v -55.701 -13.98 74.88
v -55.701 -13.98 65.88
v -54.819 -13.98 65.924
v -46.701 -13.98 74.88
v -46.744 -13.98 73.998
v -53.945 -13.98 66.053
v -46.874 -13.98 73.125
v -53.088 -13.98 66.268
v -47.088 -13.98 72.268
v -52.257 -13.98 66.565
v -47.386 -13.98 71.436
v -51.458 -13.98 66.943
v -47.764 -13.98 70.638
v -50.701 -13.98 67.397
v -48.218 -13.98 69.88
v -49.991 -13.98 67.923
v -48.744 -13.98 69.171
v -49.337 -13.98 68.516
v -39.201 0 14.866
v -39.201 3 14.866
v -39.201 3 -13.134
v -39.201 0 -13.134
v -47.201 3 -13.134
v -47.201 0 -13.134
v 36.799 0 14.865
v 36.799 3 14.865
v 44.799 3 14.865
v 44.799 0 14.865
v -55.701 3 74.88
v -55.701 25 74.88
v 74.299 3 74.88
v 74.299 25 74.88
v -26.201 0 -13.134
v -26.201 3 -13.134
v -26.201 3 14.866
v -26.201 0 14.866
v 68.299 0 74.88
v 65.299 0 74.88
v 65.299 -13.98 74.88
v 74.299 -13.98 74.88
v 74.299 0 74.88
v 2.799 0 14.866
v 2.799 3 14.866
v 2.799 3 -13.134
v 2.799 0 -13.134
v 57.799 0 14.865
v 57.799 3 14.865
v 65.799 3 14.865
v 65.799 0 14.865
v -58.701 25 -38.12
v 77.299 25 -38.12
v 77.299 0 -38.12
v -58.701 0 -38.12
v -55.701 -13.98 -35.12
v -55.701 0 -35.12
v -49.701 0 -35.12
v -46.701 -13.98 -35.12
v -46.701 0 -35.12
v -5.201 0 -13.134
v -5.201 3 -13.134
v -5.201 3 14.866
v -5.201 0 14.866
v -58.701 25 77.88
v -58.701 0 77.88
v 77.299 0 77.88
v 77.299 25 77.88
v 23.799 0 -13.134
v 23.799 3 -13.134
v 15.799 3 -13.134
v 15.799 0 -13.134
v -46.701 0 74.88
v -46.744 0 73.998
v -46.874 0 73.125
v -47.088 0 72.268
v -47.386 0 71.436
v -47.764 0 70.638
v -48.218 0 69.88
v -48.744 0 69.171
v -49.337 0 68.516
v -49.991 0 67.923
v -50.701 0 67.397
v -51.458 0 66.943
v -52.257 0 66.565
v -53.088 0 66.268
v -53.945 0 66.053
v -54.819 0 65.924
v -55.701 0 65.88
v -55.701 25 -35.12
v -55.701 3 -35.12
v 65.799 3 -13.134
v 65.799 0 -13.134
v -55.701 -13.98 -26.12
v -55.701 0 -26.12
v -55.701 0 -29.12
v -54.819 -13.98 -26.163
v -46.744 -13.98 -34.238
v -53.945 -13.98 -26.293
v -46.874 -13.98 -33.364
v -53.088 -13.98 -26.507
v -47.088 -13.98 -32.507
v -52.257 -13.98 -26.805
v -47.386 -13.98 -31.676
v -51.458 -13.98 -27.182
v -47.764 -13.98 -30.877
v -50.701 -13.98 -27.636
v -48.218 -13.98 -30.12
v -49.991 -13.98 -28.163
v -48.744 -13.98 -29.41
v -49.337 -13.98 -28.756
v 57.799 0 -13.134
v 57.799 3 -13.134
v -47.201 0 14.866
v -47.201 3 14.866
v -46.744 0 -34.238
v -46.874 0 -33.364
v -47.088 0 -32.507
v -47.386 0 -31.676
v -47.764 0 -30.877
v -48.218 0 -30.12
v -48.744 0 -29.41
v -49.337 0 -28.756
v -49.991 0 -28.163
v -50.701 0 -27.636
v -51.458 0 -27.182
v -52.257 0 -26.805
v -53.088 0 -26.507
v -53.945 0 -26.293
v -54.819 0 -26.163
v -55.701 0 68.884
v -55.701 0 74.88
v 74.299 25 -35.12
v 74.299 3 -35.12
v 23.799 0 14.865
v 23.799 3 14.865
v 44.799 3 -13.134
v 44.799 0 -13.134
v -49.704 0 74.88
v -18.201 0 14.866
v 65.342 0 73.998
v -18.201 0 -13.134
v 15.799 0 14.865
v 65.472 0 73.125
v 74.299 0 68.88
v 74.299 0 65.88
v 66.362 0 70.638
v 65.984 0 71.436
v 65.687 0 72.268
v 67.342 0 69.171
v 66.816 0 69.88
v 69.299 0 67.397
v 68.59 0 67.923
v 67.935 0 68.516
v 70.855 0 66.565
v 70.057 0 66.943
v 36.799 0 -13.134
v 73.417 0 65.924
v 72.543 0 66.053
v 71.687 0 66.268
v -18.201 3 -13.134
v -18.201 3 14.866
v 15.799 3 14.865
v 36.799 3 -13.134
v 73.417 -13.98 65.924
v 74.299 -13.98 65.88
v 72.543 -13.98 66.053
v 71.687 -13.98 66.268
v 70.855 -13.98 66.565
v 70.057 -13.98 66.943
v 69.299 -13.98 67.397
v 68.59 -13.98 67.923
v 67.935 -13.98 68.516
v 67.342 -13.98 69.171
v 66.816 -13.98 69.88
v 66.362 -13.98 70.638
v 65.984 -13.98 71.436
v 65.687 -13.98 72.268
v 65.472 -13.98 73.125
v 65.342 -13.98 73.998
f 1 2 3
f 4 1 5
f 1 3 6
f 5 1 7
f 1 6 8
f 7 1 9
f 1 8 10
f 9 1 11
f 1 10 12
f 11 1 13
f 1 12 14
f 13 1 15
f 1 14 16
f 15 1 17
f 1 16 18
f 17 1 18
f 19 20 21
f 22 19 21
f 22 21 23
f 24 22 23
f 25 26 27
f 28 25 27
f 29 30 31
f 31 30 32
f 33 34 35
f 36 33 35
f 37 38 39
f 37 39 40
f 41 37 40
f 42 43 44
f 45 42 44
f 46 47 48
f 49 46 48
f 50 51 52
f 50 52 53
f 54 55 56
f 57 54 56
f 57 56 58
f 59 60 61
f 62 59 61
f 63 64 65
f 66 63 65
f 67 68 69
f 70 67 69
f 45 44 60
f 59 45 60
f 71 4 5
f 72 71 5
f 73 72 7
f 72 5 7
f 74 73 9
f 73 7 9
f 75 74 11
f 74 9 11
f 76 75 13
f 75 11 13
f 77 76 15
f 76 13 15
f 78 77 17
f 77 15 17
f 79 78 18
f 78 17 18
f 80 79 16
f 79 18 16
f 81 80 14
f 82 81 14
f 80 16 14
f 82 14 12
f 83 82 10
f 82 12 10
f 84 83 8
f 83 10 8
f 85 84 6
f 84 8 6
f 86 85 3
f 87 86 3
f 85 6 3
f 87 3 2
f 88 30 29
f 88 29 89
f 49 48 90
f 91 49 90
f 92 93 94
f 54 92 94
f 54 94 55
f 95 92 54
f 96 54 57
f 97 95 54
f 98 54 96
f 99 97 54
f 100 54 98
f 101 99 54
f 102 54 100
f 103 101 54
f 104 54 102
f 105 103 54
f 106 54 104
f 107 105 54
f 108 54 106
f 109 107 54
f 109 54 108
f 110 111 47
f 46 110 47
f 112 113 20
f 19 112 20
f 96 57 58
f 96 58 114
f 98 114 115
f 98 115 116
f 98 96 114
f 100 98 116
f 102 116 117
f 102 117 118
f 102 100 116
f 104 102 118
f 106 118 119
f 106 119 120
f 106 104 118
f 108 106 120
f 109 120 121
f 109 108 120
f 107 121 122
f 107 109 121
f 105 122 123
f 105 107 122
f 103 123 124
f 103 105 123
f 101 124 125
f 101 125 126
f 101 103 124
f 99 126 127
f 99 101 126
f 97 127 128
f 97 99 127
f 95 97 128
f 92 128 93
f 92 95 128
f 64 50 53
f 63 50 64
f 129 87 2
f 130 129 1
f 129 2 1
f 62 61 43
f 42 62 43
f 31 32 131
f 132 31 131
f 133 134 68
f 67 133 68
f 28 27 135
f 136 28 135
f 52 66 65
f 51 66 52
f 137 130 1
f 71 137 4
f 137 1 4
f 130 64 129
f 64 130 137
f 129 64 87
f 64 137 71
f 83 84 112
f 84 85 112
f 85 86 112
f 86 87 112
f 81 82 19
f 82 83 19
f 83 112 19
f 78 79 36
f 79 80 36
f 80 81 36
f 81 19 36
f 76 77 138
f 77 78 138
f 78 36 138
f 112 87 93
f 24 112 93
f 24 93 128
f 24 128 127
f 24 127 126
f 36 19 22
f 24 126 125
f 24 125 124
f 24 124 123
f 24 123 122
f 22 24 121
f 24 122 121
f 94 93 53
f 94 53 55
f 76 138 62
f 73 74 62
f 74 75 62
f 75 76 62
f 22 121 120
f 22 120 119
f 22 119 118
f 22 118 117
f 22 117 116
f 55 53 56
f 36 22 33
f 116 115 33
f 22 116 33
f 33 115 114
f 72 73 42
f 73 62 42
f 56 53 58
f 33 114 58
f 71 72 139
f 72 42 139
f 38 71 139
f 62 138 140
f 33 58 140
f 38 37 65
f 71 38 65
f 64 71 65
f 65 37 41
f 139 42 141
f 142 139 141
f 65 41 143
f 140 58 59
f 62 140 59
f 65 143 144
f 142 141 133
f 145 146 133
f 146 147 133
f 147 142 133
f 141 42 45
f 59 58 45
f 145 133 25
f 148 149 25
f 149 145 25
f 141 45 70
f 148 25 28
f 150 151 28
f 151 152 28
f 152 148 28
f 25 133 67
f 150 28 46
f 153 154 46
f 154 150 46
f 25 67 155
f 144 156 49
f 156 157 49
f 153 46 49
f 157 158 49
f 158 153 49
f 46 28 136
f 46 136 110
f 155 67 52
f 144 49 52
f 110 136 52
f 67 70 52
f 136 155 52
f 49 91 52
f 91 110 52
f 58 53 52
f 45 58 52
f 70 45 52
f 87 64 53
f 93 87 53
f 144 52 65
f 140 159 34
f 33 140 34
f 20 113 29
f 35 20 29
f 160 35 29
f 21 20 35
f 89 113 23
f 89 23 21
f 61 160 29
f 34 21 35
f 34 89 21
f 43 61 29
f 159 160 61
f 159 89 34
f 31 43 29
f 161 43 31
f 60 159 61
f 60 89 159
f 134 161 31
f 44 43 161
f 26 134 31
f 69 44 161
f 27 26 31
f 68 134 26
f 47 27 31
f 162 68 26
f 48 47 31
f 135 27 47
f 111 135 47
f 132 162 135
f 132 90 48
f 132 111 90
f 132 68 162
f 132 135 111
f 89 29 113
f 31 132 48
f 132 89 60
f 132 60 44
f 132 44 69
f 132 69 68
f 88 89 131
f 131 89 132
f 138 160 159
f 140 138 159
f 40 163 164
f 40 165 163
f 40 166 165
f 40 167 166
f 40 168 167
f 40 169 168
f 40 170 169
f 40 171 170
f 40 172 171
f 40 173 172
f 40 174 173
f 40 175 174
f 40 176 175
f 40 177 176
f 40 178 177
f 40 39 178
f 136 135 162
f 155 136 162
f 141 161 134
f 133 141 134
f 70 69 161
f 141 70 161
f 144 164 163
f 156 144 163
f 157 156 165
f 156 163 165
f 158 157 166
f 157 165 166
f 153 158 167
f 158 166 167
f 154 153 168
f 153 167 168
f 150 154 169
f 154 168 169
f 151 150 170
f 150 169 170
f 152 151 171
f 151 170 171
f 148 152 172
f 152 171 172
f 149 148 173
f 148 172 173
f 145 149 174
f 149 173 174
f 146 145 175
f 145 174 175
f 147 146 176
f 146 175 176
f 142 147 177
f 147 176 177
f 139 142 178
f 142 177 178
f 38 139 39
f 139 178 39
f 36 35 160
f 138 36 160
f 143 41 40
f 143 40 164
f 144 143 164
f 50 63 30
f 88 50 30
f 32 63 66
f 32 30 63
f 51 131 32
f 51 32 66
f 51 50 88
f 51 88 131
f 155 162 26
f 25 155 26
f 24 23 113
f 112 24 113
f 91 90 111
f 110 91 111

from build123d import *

# Parameters (mm, degrees)
SKETCH2_W                 = 136
SKETCH2_H                 = 136
BOSS_EXTRUDE1_DEPTH       = 25
SKETCH3_W                 = 118
SKETCH3_H                 = 118
CUT_EXTRUDE1_DEPTH        = 22
CUT_EXTRUDE3_DEPTH        = 22
CUT_EXTRUDE4_DEPTH        = 22
SKETCH7_W                 = 29.69848481
SKETCH7_H                 = 30.00387357
BOSS_EXTRUDE2_DEPTH       = 25
BOSS_EXTRUDE3_DEPTH       = 3
CUT_EXTRUDE5_DEPTH        = 23
CUT_EXTRUDE6_DEPTH        = 22
CUT_EXTRUDE7_DEPTH        = 32
BOSS_EXTRUDE6_DEPTH       = 6.36
BOSS_EXTRUDE7_DEPTH       = 6.36
CUT_EXTRUDE9_DEPTH        = 6.36
CUT_EXTRUDE10_DEPTH       = 56.36
BOSS_EXTRUDE8_DEPTH       = 3
BOSS_EXTRUDE9_START       = -20
BOSS_EXTRUDE9_DEPTH       = 2
SKETCH23_W                = 29.69848481
SKETCH23_H                = 2
BOSS_EXTRUDE10_DEPTH      = 1.5
SKETCH24_W                = 10.361394494
SKETCH24_H                = 0.734081985
CUT_EXTRUDE11_DEPTH       = 31.5
BOSS_EXTRUDE11_DEPTH      = 4
BOSS_EXTRUDE12_DEPTH      = 44
CUT_EXTRUDE12_DEPTH       = 50
BOSS_EXTRUDE13_DEPTH      = 3
BOSS_EXTRUDE14_DEPTH      = 22
SKETCH33_W                = 130
SKETCH33_H                = 130
CUT_EXTRUDE13_DEPTH       = 22
CUT_EXTRUDE15_DEPTH       = 12
CUT_EXTRUDE16_DEPTH       = 32
BOSS_EXTRUDE15_DEPTH      = 22
BOSS_EXTRUDE15_DEPTH_BACK = 3
BOSS_EXTRUDE16_DEPTH      = 16.980368
CUT_EXTRUDE17_DEPTH       = 2
BOSS_EXTRUDE17_DEPTH      = 14.980368
CUT_EXTRUDE18_DEPTH       = 1
BOSS_EXTRUDE20_DEPTH      = 13.980368


with BuildPart() as part:
    # Sketch2 → Boss-Extrude1 (new body)
    with BuildSketch(Plane(origin=(0, 0, 0), x_dir=(1, 0, 0), z_dir=(0, 1, 0))):
        with Locations((9.299145299, -9.88034188)):
            Rectangle(SKETCH2_W, SKETCH2_H)
    extrude(amount=BOSS_EXTRUDE1_DEPTH)

    # Sketch3 → Cut-Extrude1 (cut)
    with BuildSketch(Plane(origin=(0, 25, 0), x_dir=(1, 0, 0), z_dir=(0, 1, 0))):
        with Locations((9.299145299, -9.88034188)):
            Rectangle(SKETCH3_W, SKETCH3_H)
    extrude(amount=-CUT_EXTRUDE1_DEPTH, mode=Mode.SUBTRACT)

    # Sketch4 → Cut-Extrude3 (cut)
    with BuildSketch(Plane(origin=(0, 25, 0), x_dir=(1, 0, 0), z_dir=(0, 1, 0))):
        Polygon((77.299145299, -77.88034188), (47.299145299, -77.88034188), (47.299145299, -68.88034188), (56.299145299, -68.88034188), (68.299145299, -56.88034188), (68.299145299, -47.88034188), (77.299145299, -47.88034188), align=None)
    extrude(amount=-CUT_EXTRUDE3_DEPTH, mode=Mode.SUBTRACT)

    # Sketch5 → Cut-Extrude4 (cut)
    with BuildSketch(Plane(origin=(0, 3, 0), x_dir=(1, 0, 0), z_dir=(0, 1, 0))):
        Polygon((68.299145299, -47.88034188), (47.299145299, -68.88034188), (47.299145299, -77.88034188), (77.299145299, -77.88034188), (77.299145299, -47.88034188), align=None)
    extrude(amount=-CUT_EXTRUDE4_DEPTH, mode=Mode.SUBTRACT)

    # Sketch7 → Boss-Extrude2 (add)
    with BuildSketch(Plane(origin=(58.08974359, 0, 58.08974359), x_dir=(0.707106781, 0, -0.707106781), z_dir=(0.707106781, 0, 0.707106781))):
        with Locations((-0.410968044, -12.001936785)):
            Rectangle(SKETCH7_W, SKETCH7_H)
    extrude(amount=BOSS_EXTRUDE2_DEPTH)

    # Sketch8 → Boss-Extrude3 (add)
    with BuildSketch(Plane(origin=(0, 3, 0), x_dir=(1, 0, 0), z_dir=(0, 1, 0))):
        Polygon((47.299145299, -77.88034188), (77.299145299, -47.88034188), (68.299145299, -47.88034188), (47.299145299, -68.88034188), align=None)
    extrude(amount=-BOSS_EXTRUDE3_DEPTH)

    # Sketch9 → Cut-Extrude5 (cut)
    with BuildSketch(Plane(origin=(0, 3, 0), x_dir=(1, 0, 0), z_dir=(0, 1, 0))):
        Polygon((47.299145299, -77.88034188), (38.299145299, -68.88034188), (47.299145299, -68.88034188), align=None)
    extrude(amount=CUT_EXTRUDE5_DEPTH, mode=Mode.SUBTRACT)

    # Sketch10 → Cut-Extrude6 (cut)
    with BuildSketch(Plane(origin=(0, 25, 0), x_dir=(1, 0, 0), z_dir=(0, 1, 0))):
        Polygon((77.299145299, -47.88034188), (68.299145299, -38.88034188), (68.299145299, -47.88034188), align=None)
    extrude(amount=-CUT_EXTRUDE6_DEPTH, mode=Mode.SUBTRACT)

    # Sketch11 → Cut-Extrude7 (cut)
    with BuildSketch(Plane(origin=(-10.790598291, 0, 10.790598291), x_dir=(0.707106781, 0, 0.707106781), z_dir=(-0.707106781, 0, 0.707106781))):
        Polygon((88.51526425, 0), (107.151303219, -18.636038969), (107.151303219, -27.00387357), (82.151303219, -27.00387357), (82.151303219, 0), align=None)
        Polygon((88.51526425, 3), (107.151303219, -15.636038969), (107.151303219, 3), align=None)
    extrude(amount=-CUT_EXTRUDE7_DEPTH, mode=Mode.SUBTRACT)

    # Sketch16 → Boss-Extrude6 (add)
    with BuildSketch(Plane(origin=(-10.790598291, 0, 10.790598291), x_dir=(0.707106781, 0, 0.707106781), z_dir=(-0.707106781, 0, 0.707106781))):
        Polygon((88.51526425, 0), (88.51526425, 3), (107.151303219, -15.636038969), (107.151303219, -18.636038969), align=None)
    extrude(amount=BOSS_EXTRUDE6_DEPTH)

    # Sketch17 → Boss-Extrude7 (add)
    with BuildSketch(Plane(origin=(10.209401709, 0, -10.209401709), x_dir=(-0.707106781, 0, -0.707106781), z_dir=(0.707106781, 0, -0.707106781))):
        Polygon((-88.51526425, 0), (-88.51526425, 3), (-107.151303219, -15.636038969), (-107.151303219, -18.636038969), align=None)
    extrude(amount=BOSS_EXTRUDE7_DEPTH)

    # Sketch18 → Cut-Extrude9 (cut)
    with BuildSketch(Plane(origin=(32.355531967, 45.757632125, 32.355531967), x_dir=(0.866025404, -0.40824829, -0.288675135), z_dir=(0.5, 0.707106781, 0.5))):
        Polygon((51.893180344, -37.364371534), (67.109442444, -58.883415765), (61.91652419, -62.555363477), align=None)
        Polygon((32.474894629, -83.373739388), (37.667812884, -79.701791676), (17.258632528, -61.854695157), align=None)
    extrude(amount=-CUT_EXTRUDE9_DEPTH, mode=Mode.SUBTRACT)

    # Sketch19 → Cut-Extrude10 (cut)
    with BuildSketch(Plane(origin=(-15.287797419, 0, 15.287797419), x_dir=(0.707106781, 0, 0.707106781), z_dir=(-0.707106781, 0, 0.707106781))):
        Polygon((107.151303219, -18.636038969), (107.151303219, -15.636038969), (105.651303219, -17.136038969), align=None)
    extrude(amount=-CUT_EXTRUDE10_DEPTH, mode=Mode.SUBTRACT)

    # Sketch20 → Boss-Extrude8 (add)
    with BuildSketch(Plane.XZ):
        Polygon((-58.700854701, 77.88034188), (47.299145299, 77.88034188), (77.299145299, 47.88034188), (77.299145299, -58.11965812), (-58.700854701, -58.11965812), align=None)
    extrude(amount=-BOSS_EXTRUDE8_DEPTH)



with BuildPart() as body_2:
    # Sketch22 → Boss-Extrude9 (new body)
    with BuildSketch(Plane(origin=(0, 3, 0), x_dir=(1, 0, 0), z_dir=(0, 1, 0)).offset(BOSS_EXTRUDE9_START)):
        Polygon((64.976814829, -86.55801141), (70.906234285, -91.928484844), (91.906234285, -70.928484844), (85.976814829, -65.55801141), align=None)
    extrude(amount=BOSS_EXTRUDE9_DEPTH)


with BuildPart() as part_1:
    add(part.part)

    add(body_2.part)  # Boss-Extrude10 merges body 2
    # Sketch23 → Boss-Extrude10 (add)
    with BuildSketch(Plane(origin=(75.767413119, 0, 75.767413119), x_dir=(-0.707106781, 0, 0.707106781), z_dir=(-0.707106781, 0, -0.707106781))):
        with Locations((0.410968044, -16)):
            Rectangle(SKETCH23_W, SKETCH23_H)
    extrude(amount=BOSS_EXTRUDE10_DEPTH)

    # Sketch24 → Cut-Extrude11 (cut)
    with BuildSketch(Plane(origin=(-13.785543706, 0, 15.220310104), x_dir=(0.741177432, 0, 0.671309179), z_dir=(-0.671309179, 0, 0.741177432))):
        with Locations((109.085839112, -17.367040993)):
            Rectangle(SKETCH24_W, SKETCH24_H)
    extrude(amount=-CUT_EXTRUDE11_DEPTH, mode=Mode.SUBTRACT)

    # Sketch28 → Boss-Extrude11 (add)
    with BuildSketch(Plane(origin=(32.355531967, 45.757632125, 32.355531967), x_dir=(0.866025404, -0.40824829, -0.288675135), z_dir=(0.5, 0.707106781, 0.5))):
        Polygon((17.25539836, -61.856982059), (8.148098637, -53.895706291), (47.339944519, -25.921031992), (51.893180344, -37.364371534), align=None)
    extrude(amount=-BOSS_EXTRUDE11_DEPTH)

    # Sketch29 → Boss-Extrude12 (add)
    with BuildSketch(Plane(origin=(14.709401709, 0, -14.709401709), x_dir=(0.707106781, 0, 0.707106781), z_dir=(-0.707106781, 0, 0.707106781))):
        Polygon((80.058656938, 11.456607312), (75.787342189, 11.456607312), (75.787342189, 3), (82.858410001, 3), align=None)
    extrude(amount=BOSS_EXTRUDE12_DEPTH)

    # Sketch30 → Cut-Extrude12 (cut)
    with BuildSketch(Plane(origin=(0, 25, 0), x_dir=(1, 0, 0), z_dir=(0, 1, 0))):
        Polygon((38.299145299, -68.88034188), (68.299145299, -38.88034188), (77.299145299, -47.88034188), (91.906234285, -70.928484844), (70.906234285, -91.928484844), (47.299145299, -77.88034188), align=None)
    extrude(amount=-CUT_EXTRUDE12_DEPTH, mode=Mode.SUBTRACT)

    # Sketch31 → Boss-Extrude13 (add)
    with BuildSketch(Plane(origin=(0, 3, 0), x_dir=(1, 0, 0), z_dir=(0, 1, 0))):
        Polygon((68.299145299, -38.88034188), (77.299145299, -47.88034188), (77.299145299, -77.88034188), (47.299145299, -77.88034188), (38.299145299, -68.88034188), align=None)
    extrude(amount=-BOSS_EXTRUDE13_DEPTH)

    # Sketch32 → Boss-Extrude14 (add)
    with BuildSketch(Plane(origin=(0, 3, 0), x_dir=(1, 0, 0), z_dir=(0, 1, 0))):
        Polygon((77.299145299, -77.88034188), (77.299145299, -47.88034188), (68.299145299, -38.88034188), (68.299145299, -68.88034188), (38.299145299, -68.88034188), (47.299145299, -77.88034188), align=None)
    extrude(amount=BOSS_EXTRUDE14_DEPTH)

    # Sketch33 → Cut-Extrude13 (cut)
    with BuildSketch(Plane(origin=(0, 25, 0), x_dir=(1, 0, 0), z_dir=(0, 1, 0))):
        with Locations((9.299145299, -9.88034188)):
            Rectangle(SKETCH33_W, SKETCH33_H)
    extrude(amount=-CUT_EXTRUDE13_DEPTH, mode=Mode.SUBTRACT)

    # Sketch34 → Cut-Extrude15 (cut)
    with BuildSketch(Plane(origin=(0, 3, 0), x_dir=(1, 0, 0), z_dir=(0, 1, 0))):
        Polygon((-43.200854701, -14.866207324), (-39.200854701, -14.866207324), (-39.200854701, 13.133792676), (-47.200854701, 13.133792676), (-47.200854701, -14.866207324), align=None)
        Polygon((-22.200854701, -14.865867711), (-18.200854701, -14.865867711), (-18.200854701, 13.133792676), (-26.200854701, 13.133792676), (-26.200854701, -14.865867711), align=None)
        Polygon((-1.200854701, -14.865528099), (2.799145299, -14.865528099), (2.799145299, 13.133792676), (-5.200854701, 13.133792676), (-5.200854701, -14.865528099), align=None)
        Polygon((19.799145299, -14.865188486), (23.799145299, -14.865188486), (23.799145299, 13.133792676), (15.799145299, 13.133792676), (15.799145299, -14.865188486), align=None)
        Polygon((40.799145299, -14.864848873), (44.799145299, -14.864848873), (44.799145299, 13.133792676), (36.799145299, 13.133792676), (36.799145299, -14.864848873), align=None)
        Polygon((61.799145299, -14.86450926), (65.799145299, -14.86450926), (65.799145299, 13.133792676), (57.799145299, 13.133792676), (57.799145299, -14.86450926), align=None)
    extrude(amount=-CUT_EXTRUDE15_DEPTH, mode=Mode.SUBTRACT)

    # Sketch35 → Cut-Extrude16 (cut)
    with BuildSketch(Plane(origin=(0, 25, 0), x_dir=(1, 0, 0), z_dir=(0, 1, 0))):
        Polygon((-55.700854701, 35.11965812), (77.299145299, 35.11965812), (77.299145299, 58.11965812), (-58.700854701, 58.11965812), (-58.700854701, 35.11965812), align=None)
    extrude(amount=-CUT_EXTRUDE16_DEPTH, mode=Mode.SUBTRACT)

    # Sketch36 → Boss-Extrude15 (add, two sides)
    with BuildSketch(Plane(origin=(0, 3, 0), x_dir=(1, 0, 0), z_dir=(0, 1, 0))) as boss_extrude15_sk:
        Polygon((-58.700854701, 35.11965812), (-55.700854701, 35.11965812), (77.299145299, 35.11965812), (77.299145299, 38.11965812), (-58.700854701, 38.11965812), align=None)
    extrude(amount=BOSS_EXTRUDE15_DEPTH)
    extrude(boss_extrude15_sk.sketch, amount=-BOSS_EXTRUDE15_DEPTH_BACK)

    # Sketch37 → Boss-Extrude16 (add)
    with BuildSketch(Plane.XZ):
        with BuildLine():
            Line((-49.704271951, 74.88034188), (-55.700854701, 74.88034188))
            Line((-55.700854701, 74.88034188), (-55.700854701, 68.883759131))
            ThreePointArc((-55.700854701, 68.883759131), (-51.460630375, 70.640117554), (-49.704271951, 74.88034188))
        make_face()
        with BuildLine():
            Line((-55.700854701, -29.11965812), (-55.700854701, -35.11965812))
            Line((-55.700854701, -35.11965812), (-49.700854701, -35.11965812))
            ThreePointArc((-49.700854701, -35.11965812), (-51.458214014, -30.877017433), (-55.700854701, -29.11965812))
        make_face()
    extrude(amount=BOSS_EXTRUDE16_DEPTH)

    # Sketch38 → Cut-Extrude17 (cut)
    with BuildSketch(Plane.XZ.offset(16.980367935)):
        with BuildLine():
            Line((-55.700854701, 74.88034188), (-55.700854701, 68.883759131))
            ThreePointArc((-55.700854701, 68.883759131), (-51.460630375, 70.640117554), (-49.704271951, 74.88034188))
            Line((-49.704271951, 74.88034188), (-55.700854701, 74.88034188))
        make_face()
        with BuildLine():
            Line((-55.700854701, -35.11965812), (-49.700854701, -35.11965812))
            ThreePointArc((-49.700854701, -35.11965812), (-51.458214014, -30.877017433), (-55.700854701, -29.11965812))
            Line((-55.700854701, -29.11965812), (-55.700854701, -35.11965812))
        make_face()
    extrude(amount=-CUT_EXTRUDE17_DEPTH, mode=Mode.SUBTRACT)

    # Sketch39 → Boss-Extrude17 (add)
    with BuildSketch(Plane.XZ):
        with BuildLine():
            Line((68.299145299, 74.88034188), (74.299145299, 74.88034188))
            Line((74.299145299, 74.88034188), (74.299145299, 68.88034188))
            ThreePointArc((74.299145299, 68.88034188), (70.056504612, 70.637701193), (68.299145299, 74.88034188))
        make_face()
    extrude(amount=BOSS_EXTRUDE17_DEPTH)

    # Sketch40 → Cut-Extrude18 (cut)
    with BuildSketch(Plane.XZ.offset(14.980367935)):
        with BuildLine():
            Line((74.299145299, 68.88034188), (74.299145299, 74.88034188))
            Line((74.299145299, 74.88034188), (68.299145299, 74.88034188))
            ThreePointArc((68.299145299, 74.88034188), (70.056504612, 70.637701193), (74.299145299, 68.88034188))
        make_face()
        with BuildLine():
            Line((-49.704271951, 74.88034188), (-55.700854701, 74.88034188))
            Line((-55.700854701, 74.88034188), (-55.700854701, 68.883759131))
            ThreePointArc((-55.700854701, 68.883759131), (-51.460630375, 70.640117554), (-49.704271951, 74.88034188))
        make_face()
        with BuildLine():
            Line((-55.700854701, -29.11965812), (-55.700854701, -35.11965812))
            Line((-55.700854701, -35.11965812), (-49.700854701, -35.11965812))
            ThreePointArc((-49.700854701, -35.11965812), (-51.458214014, -30.877017433), (-55.700854701, -29.11965812))
        make_face()
    extrude(amount=-CUT_EXTRUDE18_DEPTH, mode=Mode.SUBTRACT)

    # Sketch42 → Boss-Extrude20 (add)
    with BuildSketch(Plane(origin=(0, -13.980367935, 0), x_dir=(-1, 0, 0), z_dir=(0, -1, 0))):
        with BuildLine():
            Line((55.700854701, -65.88034188), (55.700854701, -74.88034188))
            Line((55.700854701, -74.88034188), (46.700854701, -74.88034188))
            ThreePointArc((46.700854701, -74.88034188), (49.33689367, -68.51638085), (55.700854701, -65.88034188))
        make_face()
        with BuildLine():
            Line((55.700854701, 26.11965812), (55.700854701, 35.11965812))
            Line((55.700854701, 35.11965812), (46.700854701, 35.11965812))
            ThreePointArc((46.700854701, 35.11965812), (49.33689367, 28.755697089), (55.700854701, 26.11965812))
        make_face()
        with BuildLine():
            Line((-65.299145299, -74.88034188), (-74.299145299, -74.88034188))
            Line((-74.299145299, -74.88034188), (-74.299145299, -65.88034188))
            ThreePointArc((-74.299145299, -65.88034188), (-67.935184268, -68.51638085), (-65.299145299, -74.88034188))
        make_face()
    extrude(amount=-BOSS_EXTRUDE20_DEPTH)


solid = part_1.part
